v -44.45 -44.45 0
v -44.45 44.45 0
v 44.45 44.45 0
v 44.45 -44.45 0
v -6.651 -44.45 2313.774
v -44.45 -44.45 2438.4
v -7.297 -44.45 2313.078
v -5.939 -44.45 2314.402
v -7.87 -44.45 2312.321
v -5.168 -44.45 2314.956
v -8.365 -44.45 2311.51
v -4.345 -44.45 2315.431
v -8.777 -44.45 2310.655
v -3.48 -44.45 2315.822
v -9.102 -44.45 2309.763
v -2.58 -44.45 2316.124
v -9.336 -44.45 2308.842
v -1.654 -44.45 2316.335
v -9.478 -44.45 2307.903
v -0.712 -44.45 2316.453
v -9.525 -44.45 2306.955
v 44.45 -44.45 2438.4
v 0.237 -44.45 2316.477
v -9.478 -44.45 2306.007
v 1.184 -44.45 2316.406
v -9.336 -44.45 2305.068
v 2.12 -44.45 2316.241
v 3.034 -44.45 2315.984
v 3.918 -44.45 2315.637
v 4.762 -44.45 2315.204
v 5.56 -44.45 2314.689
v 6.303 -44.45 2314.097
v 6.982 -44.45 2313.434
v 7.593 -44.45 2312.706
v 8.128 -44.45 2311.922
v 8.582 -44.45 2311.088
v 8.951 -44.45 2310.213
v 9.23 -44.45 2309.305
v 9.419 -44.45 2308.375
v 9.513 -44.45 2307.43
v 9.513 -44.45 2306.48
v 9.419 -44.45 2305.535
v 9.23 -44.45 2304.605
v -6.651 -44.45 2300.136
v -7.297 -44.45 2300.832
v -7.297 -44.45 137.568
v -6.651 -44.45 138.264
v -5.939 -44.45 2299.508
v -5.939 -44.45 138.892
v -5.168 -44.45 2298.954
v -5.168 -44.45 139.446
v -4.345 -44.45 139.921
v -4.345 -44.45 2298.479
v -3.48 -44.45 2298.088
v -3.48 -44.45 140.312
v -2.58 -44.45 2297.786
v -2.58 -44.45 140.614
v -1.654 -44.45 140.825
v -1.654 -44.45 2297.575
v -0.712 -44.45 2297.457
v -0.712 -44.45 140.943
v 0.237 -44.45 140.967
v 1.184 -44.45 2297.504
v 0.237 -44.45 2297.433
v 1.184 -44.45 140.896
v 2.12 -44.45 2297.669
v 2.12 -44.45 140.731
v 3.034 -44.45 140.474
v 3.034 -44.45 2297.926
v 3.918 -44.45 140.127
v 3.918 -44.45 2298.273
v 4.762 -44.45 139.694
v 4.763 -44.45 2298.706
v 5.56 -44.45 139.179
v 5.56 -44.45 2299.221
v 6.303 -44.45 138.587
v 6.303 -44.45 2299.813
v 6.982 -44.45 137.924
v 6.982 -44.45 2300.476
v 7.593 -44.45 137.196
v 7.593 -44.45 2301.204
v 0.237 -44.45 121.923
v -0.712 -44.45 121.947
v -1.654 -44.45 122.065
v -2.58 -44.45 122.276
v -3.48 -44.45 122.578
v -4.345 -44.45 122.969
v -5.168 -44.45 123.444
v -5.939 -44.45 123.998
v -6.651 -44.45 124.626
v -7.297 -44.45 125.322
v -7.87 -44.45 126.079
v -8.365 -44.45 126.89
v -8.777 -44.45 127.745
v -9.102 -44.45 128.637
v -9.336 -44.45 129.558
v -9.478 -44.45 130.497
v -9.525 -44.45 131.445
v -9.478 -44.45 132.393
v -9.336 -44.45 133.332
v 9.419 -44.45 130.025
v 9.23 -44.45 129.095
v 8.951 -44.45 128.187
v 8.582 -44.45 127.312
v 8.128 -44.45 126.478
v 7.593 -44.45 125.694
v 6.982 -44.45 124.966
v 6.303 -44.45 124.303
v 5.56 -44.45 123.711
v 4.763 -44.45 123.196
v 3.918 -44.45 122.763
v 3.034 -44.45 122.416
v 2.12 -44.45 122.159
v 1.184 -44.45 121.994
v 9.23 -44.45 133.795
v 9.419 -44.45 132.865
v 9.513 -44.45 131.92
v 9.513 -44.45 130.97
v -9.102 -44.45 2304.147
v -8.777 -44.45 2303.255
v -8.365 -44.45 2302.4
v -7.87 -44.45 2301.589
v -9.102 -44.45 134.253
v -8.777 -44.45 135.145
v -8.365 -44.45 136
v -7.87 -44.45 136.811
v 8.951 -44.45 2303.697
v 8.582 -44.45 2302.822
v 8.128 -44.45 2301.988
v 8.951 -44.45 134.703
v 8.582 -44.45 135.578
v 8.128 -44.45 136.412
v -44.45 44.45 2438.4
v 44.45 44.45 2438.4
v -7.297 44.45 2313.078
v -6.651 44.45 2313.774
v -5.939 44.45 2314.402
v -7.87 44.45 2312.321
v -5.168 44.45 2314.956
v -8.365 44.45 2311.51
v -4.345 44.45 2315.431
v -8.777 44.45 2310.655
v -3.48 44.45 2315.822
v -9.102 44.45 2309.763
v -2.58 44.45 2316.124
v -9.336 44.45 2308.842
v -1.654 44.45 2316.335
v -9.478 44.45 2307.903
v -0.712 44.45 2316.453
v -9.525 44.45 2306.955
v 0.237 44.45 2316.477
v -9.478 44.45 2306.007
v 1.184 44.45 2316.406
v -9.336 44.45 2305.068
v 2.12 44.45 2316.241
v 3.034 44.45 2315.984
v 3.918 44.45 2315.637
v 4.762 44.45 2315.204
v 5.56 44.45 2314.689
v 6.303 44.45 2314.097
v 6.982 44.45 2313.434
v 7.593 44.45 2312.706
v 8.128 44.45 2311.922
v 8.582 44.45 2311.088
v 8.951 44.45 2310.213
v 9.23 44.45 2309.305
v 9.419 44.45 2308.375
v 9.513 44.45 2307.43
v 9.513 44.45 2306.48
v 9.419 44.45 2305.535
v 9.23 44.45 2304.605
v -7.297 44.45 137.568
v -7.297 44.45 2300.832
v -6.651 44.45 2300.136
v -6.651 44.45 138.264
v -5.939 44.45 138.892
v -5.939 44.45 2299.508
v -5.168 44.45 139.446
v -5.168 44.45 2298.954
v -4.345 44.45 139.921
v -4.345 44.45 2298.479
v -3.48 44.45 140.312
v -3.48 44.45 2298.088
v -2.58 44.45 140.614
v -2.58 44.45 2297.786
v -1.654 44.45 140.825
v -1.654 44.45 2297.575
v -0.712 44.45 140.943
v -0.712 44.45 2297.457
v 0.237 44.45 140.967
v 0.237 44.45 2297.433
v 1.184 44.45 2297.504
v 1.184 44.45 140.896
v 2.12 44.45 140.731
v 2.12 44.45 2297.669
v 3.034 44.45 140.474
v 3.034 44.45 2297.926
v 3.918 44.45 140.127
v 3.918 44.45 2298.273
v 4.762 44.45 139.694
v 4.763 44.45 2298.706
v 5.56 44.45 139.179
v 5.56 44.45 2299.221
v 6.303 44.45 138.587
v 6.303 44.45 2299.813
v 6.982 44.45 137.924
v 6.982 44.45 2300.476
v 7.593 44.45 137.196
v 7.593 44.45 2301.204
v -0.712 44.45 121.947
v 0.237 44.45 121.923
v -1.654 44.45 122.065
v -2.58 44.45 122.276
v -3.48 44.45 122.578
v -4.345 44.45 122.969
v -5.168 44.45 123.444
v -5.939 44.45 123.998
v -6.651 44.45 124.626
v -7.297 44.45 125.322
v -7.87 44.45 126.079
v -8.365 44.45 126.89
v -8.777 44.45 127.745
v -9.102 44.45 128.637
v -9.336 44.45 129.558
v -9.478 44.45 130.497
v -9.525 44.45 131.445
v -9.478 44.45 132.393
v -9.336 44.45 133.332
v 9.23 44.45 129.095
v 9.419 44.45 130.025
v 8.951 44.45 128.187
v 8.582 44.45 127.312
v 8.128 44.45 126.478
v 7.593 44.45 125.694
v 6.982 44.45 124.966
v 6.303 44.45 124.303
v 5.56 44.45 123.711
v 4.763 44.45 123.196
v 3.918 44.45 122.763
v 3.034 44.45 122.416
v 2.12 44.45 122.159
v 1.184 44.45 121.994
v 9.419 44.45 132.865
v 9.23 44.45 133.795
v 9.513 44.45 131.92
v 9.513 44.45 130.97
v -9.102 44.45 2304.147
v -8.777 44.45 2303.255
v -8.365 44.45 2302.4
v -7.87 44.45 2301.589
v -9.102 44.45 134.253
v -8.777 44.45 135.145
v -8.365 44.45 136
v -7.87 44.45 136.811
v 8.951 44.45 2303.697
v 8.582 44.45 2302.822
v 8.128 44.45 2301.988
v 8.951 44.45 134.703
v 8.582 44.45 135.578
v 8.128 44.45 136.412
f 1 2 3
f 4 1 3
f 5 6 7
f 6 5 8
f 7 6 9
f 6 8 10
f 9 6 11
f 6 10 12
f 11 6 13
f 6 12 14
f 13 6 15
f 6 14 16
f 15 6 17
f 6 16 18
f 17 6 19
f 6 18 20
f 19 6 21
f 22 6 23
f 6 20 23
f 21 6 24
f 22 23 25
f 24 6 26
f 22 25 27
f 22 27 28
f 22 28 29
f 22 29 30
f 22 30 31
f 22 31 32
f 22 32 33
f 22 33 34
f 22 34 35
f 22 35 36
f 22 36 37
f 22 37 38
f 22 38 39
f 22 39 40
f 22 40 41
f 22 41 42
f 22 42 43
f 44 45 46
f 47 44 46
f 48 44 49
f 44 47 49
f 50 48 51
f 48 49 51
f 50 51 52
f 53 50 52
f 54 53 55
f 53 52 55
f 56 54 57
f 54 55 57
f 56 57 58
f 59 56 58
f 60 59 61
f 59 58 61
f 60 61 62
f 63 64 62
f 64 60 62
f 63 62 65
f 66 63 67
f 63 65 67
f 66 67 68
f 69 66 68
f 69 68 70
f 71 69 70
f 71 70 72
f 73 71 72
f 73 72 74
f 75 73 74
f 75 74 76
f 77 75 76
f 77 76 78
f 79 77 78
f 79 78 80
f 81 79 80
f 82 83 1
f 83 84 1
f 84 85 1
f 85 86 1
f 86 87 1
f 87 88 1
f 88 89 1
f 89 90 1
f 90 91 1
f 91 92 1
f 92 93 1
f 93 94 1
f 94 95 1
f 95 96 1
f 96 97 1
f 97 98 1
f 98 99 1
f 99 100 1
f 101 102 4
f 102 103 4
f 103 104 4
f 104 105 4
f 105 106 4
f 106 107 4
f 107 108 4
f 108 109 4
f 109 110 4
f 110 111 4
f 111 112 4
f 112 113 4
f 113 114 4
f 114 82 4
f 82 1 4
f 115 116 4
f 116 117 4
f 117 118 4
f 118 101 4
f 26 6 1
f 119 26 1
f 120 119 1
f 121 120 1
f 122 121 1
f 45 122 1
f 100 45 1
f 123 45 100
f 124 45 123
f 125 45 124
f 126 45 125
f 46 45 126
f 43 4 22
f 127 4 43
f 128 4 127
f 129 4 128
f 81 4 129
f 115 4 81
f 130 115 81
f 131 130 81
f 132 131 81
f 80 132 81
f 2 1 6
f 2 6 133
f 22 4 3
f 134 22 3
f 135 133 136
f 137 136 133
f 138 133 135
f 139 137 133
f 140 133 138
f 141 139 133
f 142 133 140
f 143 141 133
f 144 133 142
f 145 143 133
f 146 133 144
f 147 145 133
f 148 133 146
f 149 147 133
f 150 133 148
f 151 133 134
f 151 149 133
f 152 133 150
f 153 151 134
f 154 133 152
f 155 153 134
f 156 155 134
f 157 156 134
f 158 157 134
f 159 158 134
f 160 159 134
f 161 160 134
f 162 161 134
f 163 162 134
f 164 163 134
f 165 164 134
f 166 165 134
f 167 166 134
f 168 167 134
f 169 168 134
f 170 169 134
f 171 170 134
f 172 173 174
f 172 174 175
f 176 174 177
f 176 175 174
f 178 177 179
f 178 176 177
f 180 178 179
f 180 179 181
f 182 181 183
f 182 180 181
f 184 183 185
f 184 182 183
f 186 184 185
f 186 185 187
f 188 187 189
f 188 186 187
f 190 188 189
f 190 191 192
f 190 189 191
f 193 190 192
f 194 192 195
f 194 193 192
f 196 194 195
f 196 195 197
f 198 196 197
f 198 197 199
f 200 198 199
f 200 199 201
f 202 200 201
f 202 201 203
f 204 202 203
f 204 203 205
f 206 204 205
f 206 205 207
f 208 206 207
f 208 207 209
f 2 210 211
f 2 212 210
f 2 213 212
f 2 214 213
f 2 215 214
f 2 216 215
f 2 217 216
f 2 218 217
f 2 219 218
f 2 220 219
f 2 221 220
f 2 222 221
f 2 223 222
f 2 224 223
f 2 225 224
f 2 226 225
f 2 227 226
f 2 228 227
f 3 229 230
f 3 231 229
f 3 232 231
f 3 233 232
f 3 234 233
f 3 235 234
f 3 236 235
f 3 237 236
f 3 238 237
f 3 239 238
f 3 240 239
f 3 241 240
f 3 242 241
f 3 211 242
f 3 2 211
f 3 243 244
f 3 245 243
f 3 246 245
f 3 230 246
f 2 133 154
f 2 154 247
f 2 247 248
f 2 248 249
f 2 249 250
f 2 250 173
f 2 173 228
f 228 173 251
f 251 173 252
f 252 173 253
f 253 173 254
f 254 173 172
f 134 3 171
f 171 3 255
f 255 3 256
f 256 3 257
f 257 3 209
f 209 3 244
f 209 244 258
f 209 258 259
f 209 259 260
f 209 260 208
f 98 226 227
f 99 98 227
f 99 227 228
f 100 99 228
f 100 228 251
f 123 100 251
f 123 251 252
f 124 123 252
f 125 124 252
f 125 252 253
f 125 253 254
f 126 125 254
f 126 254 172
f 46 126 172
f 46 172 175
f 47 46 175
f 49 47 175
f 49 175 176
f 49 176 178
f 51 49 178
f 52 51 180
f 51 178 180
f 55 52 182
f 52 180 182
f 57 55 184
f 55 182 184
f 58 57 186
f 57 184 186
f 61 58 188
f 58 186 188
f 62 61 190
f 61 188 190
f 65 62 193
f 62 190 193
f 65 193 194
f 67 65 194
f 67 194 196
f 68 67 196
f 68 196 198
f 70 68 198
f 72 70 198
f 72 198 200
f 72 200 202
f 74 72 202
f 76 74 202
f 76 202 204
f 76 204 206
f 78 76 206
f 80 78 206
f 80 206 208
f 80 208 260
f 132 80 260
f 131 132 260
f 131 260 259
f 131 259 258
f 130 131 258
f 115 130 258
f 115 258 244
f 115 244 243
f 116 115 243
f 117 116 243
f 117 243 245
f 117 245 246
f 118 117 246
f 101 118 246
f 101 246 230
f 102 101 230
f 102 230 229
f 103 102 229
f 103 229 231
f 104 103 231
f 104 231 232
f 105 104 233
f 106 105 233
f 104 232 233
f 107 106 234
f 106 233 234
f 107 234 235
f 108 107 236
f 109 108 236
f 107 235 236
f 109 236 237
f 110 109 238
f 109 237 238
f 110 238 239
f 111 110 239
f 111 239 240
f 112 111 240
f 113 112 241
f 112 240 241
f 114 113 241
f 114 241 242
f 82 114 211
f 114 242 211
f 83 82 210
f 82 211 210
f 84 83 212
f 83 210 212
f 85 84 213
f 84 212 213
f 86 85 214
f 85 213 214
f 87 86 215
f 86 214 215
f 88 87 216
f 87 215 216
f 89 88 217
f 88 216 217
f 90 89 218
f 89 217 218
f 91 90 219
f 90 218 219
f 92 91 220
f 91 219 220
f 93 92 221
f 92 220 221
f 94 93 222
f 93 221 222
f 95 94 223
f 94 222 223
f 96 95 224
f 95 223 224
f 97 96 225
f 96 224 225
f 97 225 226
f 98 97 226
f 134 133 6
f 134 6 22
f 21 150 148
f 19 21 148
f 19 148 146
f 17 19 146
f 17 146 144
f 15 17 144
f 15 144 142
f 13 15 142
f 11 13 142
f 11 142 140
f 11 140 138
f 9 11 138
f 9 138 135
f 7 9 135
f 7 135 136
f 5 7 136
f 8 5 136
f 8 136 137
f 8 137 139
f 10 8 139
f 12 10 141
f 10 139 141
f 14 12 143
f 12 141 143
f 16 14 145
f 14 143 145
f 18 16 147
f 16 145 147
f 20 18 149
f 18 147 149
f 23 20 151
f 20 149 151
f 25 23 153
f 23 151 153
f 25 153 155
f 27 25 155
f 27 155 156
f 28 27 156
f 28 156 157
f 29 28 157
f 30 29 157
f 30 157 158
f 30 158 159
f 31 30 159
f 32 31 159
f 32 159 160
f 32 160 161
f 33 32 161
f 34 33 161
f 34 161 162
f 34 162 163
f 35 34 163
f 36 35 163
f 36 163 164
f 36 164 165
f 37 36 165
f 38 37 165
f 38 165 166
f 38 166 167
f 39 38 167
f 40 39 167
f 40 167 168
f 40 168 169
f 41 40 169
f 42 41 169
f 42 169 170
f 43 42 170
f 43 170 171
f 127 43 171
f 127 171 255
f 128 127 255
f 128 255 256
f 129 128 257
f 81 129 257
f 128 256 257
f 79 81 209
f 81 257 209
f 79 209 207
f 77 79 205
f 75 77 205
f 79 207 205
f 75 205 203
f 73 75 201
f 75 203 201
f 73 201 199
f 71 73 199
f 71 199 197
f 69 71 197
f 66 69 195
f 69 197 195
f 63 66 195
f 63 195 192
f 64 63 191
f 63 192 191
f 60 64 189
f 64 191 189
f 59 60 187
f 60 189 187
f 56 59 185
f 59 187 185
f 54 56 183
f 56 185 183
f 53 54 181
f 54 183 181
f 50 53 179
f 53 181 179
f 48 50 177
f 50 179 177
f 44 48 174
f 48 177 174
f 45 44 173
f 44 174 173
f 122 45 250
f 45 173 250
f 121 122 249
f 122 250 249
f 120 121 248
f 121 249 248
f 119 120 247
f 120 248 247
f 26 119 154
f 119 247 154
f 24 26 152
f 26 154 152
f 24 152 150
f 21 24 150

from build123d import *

# Parameters (mm, degrees)
F0_W     = 88.9
F0_H     = 88.9
F1_DEPTH = 2438.4
F3_D     = 19.05


with BuildPart() as f1:
    # F0 (on Top) → F1 (new body)
    with BuildSketch(Plane.XY):
        Rectangle(F0_W, F0_H)
    extrude(amount=F1_DEPTH)

    # F3 (through all)
    with Locations(Plane.XZ.offset(44.45)):
        with Locations((0, 131.445), (0, 2306.955)):
            Hole(F3_D / 2)


solid = f1.part
